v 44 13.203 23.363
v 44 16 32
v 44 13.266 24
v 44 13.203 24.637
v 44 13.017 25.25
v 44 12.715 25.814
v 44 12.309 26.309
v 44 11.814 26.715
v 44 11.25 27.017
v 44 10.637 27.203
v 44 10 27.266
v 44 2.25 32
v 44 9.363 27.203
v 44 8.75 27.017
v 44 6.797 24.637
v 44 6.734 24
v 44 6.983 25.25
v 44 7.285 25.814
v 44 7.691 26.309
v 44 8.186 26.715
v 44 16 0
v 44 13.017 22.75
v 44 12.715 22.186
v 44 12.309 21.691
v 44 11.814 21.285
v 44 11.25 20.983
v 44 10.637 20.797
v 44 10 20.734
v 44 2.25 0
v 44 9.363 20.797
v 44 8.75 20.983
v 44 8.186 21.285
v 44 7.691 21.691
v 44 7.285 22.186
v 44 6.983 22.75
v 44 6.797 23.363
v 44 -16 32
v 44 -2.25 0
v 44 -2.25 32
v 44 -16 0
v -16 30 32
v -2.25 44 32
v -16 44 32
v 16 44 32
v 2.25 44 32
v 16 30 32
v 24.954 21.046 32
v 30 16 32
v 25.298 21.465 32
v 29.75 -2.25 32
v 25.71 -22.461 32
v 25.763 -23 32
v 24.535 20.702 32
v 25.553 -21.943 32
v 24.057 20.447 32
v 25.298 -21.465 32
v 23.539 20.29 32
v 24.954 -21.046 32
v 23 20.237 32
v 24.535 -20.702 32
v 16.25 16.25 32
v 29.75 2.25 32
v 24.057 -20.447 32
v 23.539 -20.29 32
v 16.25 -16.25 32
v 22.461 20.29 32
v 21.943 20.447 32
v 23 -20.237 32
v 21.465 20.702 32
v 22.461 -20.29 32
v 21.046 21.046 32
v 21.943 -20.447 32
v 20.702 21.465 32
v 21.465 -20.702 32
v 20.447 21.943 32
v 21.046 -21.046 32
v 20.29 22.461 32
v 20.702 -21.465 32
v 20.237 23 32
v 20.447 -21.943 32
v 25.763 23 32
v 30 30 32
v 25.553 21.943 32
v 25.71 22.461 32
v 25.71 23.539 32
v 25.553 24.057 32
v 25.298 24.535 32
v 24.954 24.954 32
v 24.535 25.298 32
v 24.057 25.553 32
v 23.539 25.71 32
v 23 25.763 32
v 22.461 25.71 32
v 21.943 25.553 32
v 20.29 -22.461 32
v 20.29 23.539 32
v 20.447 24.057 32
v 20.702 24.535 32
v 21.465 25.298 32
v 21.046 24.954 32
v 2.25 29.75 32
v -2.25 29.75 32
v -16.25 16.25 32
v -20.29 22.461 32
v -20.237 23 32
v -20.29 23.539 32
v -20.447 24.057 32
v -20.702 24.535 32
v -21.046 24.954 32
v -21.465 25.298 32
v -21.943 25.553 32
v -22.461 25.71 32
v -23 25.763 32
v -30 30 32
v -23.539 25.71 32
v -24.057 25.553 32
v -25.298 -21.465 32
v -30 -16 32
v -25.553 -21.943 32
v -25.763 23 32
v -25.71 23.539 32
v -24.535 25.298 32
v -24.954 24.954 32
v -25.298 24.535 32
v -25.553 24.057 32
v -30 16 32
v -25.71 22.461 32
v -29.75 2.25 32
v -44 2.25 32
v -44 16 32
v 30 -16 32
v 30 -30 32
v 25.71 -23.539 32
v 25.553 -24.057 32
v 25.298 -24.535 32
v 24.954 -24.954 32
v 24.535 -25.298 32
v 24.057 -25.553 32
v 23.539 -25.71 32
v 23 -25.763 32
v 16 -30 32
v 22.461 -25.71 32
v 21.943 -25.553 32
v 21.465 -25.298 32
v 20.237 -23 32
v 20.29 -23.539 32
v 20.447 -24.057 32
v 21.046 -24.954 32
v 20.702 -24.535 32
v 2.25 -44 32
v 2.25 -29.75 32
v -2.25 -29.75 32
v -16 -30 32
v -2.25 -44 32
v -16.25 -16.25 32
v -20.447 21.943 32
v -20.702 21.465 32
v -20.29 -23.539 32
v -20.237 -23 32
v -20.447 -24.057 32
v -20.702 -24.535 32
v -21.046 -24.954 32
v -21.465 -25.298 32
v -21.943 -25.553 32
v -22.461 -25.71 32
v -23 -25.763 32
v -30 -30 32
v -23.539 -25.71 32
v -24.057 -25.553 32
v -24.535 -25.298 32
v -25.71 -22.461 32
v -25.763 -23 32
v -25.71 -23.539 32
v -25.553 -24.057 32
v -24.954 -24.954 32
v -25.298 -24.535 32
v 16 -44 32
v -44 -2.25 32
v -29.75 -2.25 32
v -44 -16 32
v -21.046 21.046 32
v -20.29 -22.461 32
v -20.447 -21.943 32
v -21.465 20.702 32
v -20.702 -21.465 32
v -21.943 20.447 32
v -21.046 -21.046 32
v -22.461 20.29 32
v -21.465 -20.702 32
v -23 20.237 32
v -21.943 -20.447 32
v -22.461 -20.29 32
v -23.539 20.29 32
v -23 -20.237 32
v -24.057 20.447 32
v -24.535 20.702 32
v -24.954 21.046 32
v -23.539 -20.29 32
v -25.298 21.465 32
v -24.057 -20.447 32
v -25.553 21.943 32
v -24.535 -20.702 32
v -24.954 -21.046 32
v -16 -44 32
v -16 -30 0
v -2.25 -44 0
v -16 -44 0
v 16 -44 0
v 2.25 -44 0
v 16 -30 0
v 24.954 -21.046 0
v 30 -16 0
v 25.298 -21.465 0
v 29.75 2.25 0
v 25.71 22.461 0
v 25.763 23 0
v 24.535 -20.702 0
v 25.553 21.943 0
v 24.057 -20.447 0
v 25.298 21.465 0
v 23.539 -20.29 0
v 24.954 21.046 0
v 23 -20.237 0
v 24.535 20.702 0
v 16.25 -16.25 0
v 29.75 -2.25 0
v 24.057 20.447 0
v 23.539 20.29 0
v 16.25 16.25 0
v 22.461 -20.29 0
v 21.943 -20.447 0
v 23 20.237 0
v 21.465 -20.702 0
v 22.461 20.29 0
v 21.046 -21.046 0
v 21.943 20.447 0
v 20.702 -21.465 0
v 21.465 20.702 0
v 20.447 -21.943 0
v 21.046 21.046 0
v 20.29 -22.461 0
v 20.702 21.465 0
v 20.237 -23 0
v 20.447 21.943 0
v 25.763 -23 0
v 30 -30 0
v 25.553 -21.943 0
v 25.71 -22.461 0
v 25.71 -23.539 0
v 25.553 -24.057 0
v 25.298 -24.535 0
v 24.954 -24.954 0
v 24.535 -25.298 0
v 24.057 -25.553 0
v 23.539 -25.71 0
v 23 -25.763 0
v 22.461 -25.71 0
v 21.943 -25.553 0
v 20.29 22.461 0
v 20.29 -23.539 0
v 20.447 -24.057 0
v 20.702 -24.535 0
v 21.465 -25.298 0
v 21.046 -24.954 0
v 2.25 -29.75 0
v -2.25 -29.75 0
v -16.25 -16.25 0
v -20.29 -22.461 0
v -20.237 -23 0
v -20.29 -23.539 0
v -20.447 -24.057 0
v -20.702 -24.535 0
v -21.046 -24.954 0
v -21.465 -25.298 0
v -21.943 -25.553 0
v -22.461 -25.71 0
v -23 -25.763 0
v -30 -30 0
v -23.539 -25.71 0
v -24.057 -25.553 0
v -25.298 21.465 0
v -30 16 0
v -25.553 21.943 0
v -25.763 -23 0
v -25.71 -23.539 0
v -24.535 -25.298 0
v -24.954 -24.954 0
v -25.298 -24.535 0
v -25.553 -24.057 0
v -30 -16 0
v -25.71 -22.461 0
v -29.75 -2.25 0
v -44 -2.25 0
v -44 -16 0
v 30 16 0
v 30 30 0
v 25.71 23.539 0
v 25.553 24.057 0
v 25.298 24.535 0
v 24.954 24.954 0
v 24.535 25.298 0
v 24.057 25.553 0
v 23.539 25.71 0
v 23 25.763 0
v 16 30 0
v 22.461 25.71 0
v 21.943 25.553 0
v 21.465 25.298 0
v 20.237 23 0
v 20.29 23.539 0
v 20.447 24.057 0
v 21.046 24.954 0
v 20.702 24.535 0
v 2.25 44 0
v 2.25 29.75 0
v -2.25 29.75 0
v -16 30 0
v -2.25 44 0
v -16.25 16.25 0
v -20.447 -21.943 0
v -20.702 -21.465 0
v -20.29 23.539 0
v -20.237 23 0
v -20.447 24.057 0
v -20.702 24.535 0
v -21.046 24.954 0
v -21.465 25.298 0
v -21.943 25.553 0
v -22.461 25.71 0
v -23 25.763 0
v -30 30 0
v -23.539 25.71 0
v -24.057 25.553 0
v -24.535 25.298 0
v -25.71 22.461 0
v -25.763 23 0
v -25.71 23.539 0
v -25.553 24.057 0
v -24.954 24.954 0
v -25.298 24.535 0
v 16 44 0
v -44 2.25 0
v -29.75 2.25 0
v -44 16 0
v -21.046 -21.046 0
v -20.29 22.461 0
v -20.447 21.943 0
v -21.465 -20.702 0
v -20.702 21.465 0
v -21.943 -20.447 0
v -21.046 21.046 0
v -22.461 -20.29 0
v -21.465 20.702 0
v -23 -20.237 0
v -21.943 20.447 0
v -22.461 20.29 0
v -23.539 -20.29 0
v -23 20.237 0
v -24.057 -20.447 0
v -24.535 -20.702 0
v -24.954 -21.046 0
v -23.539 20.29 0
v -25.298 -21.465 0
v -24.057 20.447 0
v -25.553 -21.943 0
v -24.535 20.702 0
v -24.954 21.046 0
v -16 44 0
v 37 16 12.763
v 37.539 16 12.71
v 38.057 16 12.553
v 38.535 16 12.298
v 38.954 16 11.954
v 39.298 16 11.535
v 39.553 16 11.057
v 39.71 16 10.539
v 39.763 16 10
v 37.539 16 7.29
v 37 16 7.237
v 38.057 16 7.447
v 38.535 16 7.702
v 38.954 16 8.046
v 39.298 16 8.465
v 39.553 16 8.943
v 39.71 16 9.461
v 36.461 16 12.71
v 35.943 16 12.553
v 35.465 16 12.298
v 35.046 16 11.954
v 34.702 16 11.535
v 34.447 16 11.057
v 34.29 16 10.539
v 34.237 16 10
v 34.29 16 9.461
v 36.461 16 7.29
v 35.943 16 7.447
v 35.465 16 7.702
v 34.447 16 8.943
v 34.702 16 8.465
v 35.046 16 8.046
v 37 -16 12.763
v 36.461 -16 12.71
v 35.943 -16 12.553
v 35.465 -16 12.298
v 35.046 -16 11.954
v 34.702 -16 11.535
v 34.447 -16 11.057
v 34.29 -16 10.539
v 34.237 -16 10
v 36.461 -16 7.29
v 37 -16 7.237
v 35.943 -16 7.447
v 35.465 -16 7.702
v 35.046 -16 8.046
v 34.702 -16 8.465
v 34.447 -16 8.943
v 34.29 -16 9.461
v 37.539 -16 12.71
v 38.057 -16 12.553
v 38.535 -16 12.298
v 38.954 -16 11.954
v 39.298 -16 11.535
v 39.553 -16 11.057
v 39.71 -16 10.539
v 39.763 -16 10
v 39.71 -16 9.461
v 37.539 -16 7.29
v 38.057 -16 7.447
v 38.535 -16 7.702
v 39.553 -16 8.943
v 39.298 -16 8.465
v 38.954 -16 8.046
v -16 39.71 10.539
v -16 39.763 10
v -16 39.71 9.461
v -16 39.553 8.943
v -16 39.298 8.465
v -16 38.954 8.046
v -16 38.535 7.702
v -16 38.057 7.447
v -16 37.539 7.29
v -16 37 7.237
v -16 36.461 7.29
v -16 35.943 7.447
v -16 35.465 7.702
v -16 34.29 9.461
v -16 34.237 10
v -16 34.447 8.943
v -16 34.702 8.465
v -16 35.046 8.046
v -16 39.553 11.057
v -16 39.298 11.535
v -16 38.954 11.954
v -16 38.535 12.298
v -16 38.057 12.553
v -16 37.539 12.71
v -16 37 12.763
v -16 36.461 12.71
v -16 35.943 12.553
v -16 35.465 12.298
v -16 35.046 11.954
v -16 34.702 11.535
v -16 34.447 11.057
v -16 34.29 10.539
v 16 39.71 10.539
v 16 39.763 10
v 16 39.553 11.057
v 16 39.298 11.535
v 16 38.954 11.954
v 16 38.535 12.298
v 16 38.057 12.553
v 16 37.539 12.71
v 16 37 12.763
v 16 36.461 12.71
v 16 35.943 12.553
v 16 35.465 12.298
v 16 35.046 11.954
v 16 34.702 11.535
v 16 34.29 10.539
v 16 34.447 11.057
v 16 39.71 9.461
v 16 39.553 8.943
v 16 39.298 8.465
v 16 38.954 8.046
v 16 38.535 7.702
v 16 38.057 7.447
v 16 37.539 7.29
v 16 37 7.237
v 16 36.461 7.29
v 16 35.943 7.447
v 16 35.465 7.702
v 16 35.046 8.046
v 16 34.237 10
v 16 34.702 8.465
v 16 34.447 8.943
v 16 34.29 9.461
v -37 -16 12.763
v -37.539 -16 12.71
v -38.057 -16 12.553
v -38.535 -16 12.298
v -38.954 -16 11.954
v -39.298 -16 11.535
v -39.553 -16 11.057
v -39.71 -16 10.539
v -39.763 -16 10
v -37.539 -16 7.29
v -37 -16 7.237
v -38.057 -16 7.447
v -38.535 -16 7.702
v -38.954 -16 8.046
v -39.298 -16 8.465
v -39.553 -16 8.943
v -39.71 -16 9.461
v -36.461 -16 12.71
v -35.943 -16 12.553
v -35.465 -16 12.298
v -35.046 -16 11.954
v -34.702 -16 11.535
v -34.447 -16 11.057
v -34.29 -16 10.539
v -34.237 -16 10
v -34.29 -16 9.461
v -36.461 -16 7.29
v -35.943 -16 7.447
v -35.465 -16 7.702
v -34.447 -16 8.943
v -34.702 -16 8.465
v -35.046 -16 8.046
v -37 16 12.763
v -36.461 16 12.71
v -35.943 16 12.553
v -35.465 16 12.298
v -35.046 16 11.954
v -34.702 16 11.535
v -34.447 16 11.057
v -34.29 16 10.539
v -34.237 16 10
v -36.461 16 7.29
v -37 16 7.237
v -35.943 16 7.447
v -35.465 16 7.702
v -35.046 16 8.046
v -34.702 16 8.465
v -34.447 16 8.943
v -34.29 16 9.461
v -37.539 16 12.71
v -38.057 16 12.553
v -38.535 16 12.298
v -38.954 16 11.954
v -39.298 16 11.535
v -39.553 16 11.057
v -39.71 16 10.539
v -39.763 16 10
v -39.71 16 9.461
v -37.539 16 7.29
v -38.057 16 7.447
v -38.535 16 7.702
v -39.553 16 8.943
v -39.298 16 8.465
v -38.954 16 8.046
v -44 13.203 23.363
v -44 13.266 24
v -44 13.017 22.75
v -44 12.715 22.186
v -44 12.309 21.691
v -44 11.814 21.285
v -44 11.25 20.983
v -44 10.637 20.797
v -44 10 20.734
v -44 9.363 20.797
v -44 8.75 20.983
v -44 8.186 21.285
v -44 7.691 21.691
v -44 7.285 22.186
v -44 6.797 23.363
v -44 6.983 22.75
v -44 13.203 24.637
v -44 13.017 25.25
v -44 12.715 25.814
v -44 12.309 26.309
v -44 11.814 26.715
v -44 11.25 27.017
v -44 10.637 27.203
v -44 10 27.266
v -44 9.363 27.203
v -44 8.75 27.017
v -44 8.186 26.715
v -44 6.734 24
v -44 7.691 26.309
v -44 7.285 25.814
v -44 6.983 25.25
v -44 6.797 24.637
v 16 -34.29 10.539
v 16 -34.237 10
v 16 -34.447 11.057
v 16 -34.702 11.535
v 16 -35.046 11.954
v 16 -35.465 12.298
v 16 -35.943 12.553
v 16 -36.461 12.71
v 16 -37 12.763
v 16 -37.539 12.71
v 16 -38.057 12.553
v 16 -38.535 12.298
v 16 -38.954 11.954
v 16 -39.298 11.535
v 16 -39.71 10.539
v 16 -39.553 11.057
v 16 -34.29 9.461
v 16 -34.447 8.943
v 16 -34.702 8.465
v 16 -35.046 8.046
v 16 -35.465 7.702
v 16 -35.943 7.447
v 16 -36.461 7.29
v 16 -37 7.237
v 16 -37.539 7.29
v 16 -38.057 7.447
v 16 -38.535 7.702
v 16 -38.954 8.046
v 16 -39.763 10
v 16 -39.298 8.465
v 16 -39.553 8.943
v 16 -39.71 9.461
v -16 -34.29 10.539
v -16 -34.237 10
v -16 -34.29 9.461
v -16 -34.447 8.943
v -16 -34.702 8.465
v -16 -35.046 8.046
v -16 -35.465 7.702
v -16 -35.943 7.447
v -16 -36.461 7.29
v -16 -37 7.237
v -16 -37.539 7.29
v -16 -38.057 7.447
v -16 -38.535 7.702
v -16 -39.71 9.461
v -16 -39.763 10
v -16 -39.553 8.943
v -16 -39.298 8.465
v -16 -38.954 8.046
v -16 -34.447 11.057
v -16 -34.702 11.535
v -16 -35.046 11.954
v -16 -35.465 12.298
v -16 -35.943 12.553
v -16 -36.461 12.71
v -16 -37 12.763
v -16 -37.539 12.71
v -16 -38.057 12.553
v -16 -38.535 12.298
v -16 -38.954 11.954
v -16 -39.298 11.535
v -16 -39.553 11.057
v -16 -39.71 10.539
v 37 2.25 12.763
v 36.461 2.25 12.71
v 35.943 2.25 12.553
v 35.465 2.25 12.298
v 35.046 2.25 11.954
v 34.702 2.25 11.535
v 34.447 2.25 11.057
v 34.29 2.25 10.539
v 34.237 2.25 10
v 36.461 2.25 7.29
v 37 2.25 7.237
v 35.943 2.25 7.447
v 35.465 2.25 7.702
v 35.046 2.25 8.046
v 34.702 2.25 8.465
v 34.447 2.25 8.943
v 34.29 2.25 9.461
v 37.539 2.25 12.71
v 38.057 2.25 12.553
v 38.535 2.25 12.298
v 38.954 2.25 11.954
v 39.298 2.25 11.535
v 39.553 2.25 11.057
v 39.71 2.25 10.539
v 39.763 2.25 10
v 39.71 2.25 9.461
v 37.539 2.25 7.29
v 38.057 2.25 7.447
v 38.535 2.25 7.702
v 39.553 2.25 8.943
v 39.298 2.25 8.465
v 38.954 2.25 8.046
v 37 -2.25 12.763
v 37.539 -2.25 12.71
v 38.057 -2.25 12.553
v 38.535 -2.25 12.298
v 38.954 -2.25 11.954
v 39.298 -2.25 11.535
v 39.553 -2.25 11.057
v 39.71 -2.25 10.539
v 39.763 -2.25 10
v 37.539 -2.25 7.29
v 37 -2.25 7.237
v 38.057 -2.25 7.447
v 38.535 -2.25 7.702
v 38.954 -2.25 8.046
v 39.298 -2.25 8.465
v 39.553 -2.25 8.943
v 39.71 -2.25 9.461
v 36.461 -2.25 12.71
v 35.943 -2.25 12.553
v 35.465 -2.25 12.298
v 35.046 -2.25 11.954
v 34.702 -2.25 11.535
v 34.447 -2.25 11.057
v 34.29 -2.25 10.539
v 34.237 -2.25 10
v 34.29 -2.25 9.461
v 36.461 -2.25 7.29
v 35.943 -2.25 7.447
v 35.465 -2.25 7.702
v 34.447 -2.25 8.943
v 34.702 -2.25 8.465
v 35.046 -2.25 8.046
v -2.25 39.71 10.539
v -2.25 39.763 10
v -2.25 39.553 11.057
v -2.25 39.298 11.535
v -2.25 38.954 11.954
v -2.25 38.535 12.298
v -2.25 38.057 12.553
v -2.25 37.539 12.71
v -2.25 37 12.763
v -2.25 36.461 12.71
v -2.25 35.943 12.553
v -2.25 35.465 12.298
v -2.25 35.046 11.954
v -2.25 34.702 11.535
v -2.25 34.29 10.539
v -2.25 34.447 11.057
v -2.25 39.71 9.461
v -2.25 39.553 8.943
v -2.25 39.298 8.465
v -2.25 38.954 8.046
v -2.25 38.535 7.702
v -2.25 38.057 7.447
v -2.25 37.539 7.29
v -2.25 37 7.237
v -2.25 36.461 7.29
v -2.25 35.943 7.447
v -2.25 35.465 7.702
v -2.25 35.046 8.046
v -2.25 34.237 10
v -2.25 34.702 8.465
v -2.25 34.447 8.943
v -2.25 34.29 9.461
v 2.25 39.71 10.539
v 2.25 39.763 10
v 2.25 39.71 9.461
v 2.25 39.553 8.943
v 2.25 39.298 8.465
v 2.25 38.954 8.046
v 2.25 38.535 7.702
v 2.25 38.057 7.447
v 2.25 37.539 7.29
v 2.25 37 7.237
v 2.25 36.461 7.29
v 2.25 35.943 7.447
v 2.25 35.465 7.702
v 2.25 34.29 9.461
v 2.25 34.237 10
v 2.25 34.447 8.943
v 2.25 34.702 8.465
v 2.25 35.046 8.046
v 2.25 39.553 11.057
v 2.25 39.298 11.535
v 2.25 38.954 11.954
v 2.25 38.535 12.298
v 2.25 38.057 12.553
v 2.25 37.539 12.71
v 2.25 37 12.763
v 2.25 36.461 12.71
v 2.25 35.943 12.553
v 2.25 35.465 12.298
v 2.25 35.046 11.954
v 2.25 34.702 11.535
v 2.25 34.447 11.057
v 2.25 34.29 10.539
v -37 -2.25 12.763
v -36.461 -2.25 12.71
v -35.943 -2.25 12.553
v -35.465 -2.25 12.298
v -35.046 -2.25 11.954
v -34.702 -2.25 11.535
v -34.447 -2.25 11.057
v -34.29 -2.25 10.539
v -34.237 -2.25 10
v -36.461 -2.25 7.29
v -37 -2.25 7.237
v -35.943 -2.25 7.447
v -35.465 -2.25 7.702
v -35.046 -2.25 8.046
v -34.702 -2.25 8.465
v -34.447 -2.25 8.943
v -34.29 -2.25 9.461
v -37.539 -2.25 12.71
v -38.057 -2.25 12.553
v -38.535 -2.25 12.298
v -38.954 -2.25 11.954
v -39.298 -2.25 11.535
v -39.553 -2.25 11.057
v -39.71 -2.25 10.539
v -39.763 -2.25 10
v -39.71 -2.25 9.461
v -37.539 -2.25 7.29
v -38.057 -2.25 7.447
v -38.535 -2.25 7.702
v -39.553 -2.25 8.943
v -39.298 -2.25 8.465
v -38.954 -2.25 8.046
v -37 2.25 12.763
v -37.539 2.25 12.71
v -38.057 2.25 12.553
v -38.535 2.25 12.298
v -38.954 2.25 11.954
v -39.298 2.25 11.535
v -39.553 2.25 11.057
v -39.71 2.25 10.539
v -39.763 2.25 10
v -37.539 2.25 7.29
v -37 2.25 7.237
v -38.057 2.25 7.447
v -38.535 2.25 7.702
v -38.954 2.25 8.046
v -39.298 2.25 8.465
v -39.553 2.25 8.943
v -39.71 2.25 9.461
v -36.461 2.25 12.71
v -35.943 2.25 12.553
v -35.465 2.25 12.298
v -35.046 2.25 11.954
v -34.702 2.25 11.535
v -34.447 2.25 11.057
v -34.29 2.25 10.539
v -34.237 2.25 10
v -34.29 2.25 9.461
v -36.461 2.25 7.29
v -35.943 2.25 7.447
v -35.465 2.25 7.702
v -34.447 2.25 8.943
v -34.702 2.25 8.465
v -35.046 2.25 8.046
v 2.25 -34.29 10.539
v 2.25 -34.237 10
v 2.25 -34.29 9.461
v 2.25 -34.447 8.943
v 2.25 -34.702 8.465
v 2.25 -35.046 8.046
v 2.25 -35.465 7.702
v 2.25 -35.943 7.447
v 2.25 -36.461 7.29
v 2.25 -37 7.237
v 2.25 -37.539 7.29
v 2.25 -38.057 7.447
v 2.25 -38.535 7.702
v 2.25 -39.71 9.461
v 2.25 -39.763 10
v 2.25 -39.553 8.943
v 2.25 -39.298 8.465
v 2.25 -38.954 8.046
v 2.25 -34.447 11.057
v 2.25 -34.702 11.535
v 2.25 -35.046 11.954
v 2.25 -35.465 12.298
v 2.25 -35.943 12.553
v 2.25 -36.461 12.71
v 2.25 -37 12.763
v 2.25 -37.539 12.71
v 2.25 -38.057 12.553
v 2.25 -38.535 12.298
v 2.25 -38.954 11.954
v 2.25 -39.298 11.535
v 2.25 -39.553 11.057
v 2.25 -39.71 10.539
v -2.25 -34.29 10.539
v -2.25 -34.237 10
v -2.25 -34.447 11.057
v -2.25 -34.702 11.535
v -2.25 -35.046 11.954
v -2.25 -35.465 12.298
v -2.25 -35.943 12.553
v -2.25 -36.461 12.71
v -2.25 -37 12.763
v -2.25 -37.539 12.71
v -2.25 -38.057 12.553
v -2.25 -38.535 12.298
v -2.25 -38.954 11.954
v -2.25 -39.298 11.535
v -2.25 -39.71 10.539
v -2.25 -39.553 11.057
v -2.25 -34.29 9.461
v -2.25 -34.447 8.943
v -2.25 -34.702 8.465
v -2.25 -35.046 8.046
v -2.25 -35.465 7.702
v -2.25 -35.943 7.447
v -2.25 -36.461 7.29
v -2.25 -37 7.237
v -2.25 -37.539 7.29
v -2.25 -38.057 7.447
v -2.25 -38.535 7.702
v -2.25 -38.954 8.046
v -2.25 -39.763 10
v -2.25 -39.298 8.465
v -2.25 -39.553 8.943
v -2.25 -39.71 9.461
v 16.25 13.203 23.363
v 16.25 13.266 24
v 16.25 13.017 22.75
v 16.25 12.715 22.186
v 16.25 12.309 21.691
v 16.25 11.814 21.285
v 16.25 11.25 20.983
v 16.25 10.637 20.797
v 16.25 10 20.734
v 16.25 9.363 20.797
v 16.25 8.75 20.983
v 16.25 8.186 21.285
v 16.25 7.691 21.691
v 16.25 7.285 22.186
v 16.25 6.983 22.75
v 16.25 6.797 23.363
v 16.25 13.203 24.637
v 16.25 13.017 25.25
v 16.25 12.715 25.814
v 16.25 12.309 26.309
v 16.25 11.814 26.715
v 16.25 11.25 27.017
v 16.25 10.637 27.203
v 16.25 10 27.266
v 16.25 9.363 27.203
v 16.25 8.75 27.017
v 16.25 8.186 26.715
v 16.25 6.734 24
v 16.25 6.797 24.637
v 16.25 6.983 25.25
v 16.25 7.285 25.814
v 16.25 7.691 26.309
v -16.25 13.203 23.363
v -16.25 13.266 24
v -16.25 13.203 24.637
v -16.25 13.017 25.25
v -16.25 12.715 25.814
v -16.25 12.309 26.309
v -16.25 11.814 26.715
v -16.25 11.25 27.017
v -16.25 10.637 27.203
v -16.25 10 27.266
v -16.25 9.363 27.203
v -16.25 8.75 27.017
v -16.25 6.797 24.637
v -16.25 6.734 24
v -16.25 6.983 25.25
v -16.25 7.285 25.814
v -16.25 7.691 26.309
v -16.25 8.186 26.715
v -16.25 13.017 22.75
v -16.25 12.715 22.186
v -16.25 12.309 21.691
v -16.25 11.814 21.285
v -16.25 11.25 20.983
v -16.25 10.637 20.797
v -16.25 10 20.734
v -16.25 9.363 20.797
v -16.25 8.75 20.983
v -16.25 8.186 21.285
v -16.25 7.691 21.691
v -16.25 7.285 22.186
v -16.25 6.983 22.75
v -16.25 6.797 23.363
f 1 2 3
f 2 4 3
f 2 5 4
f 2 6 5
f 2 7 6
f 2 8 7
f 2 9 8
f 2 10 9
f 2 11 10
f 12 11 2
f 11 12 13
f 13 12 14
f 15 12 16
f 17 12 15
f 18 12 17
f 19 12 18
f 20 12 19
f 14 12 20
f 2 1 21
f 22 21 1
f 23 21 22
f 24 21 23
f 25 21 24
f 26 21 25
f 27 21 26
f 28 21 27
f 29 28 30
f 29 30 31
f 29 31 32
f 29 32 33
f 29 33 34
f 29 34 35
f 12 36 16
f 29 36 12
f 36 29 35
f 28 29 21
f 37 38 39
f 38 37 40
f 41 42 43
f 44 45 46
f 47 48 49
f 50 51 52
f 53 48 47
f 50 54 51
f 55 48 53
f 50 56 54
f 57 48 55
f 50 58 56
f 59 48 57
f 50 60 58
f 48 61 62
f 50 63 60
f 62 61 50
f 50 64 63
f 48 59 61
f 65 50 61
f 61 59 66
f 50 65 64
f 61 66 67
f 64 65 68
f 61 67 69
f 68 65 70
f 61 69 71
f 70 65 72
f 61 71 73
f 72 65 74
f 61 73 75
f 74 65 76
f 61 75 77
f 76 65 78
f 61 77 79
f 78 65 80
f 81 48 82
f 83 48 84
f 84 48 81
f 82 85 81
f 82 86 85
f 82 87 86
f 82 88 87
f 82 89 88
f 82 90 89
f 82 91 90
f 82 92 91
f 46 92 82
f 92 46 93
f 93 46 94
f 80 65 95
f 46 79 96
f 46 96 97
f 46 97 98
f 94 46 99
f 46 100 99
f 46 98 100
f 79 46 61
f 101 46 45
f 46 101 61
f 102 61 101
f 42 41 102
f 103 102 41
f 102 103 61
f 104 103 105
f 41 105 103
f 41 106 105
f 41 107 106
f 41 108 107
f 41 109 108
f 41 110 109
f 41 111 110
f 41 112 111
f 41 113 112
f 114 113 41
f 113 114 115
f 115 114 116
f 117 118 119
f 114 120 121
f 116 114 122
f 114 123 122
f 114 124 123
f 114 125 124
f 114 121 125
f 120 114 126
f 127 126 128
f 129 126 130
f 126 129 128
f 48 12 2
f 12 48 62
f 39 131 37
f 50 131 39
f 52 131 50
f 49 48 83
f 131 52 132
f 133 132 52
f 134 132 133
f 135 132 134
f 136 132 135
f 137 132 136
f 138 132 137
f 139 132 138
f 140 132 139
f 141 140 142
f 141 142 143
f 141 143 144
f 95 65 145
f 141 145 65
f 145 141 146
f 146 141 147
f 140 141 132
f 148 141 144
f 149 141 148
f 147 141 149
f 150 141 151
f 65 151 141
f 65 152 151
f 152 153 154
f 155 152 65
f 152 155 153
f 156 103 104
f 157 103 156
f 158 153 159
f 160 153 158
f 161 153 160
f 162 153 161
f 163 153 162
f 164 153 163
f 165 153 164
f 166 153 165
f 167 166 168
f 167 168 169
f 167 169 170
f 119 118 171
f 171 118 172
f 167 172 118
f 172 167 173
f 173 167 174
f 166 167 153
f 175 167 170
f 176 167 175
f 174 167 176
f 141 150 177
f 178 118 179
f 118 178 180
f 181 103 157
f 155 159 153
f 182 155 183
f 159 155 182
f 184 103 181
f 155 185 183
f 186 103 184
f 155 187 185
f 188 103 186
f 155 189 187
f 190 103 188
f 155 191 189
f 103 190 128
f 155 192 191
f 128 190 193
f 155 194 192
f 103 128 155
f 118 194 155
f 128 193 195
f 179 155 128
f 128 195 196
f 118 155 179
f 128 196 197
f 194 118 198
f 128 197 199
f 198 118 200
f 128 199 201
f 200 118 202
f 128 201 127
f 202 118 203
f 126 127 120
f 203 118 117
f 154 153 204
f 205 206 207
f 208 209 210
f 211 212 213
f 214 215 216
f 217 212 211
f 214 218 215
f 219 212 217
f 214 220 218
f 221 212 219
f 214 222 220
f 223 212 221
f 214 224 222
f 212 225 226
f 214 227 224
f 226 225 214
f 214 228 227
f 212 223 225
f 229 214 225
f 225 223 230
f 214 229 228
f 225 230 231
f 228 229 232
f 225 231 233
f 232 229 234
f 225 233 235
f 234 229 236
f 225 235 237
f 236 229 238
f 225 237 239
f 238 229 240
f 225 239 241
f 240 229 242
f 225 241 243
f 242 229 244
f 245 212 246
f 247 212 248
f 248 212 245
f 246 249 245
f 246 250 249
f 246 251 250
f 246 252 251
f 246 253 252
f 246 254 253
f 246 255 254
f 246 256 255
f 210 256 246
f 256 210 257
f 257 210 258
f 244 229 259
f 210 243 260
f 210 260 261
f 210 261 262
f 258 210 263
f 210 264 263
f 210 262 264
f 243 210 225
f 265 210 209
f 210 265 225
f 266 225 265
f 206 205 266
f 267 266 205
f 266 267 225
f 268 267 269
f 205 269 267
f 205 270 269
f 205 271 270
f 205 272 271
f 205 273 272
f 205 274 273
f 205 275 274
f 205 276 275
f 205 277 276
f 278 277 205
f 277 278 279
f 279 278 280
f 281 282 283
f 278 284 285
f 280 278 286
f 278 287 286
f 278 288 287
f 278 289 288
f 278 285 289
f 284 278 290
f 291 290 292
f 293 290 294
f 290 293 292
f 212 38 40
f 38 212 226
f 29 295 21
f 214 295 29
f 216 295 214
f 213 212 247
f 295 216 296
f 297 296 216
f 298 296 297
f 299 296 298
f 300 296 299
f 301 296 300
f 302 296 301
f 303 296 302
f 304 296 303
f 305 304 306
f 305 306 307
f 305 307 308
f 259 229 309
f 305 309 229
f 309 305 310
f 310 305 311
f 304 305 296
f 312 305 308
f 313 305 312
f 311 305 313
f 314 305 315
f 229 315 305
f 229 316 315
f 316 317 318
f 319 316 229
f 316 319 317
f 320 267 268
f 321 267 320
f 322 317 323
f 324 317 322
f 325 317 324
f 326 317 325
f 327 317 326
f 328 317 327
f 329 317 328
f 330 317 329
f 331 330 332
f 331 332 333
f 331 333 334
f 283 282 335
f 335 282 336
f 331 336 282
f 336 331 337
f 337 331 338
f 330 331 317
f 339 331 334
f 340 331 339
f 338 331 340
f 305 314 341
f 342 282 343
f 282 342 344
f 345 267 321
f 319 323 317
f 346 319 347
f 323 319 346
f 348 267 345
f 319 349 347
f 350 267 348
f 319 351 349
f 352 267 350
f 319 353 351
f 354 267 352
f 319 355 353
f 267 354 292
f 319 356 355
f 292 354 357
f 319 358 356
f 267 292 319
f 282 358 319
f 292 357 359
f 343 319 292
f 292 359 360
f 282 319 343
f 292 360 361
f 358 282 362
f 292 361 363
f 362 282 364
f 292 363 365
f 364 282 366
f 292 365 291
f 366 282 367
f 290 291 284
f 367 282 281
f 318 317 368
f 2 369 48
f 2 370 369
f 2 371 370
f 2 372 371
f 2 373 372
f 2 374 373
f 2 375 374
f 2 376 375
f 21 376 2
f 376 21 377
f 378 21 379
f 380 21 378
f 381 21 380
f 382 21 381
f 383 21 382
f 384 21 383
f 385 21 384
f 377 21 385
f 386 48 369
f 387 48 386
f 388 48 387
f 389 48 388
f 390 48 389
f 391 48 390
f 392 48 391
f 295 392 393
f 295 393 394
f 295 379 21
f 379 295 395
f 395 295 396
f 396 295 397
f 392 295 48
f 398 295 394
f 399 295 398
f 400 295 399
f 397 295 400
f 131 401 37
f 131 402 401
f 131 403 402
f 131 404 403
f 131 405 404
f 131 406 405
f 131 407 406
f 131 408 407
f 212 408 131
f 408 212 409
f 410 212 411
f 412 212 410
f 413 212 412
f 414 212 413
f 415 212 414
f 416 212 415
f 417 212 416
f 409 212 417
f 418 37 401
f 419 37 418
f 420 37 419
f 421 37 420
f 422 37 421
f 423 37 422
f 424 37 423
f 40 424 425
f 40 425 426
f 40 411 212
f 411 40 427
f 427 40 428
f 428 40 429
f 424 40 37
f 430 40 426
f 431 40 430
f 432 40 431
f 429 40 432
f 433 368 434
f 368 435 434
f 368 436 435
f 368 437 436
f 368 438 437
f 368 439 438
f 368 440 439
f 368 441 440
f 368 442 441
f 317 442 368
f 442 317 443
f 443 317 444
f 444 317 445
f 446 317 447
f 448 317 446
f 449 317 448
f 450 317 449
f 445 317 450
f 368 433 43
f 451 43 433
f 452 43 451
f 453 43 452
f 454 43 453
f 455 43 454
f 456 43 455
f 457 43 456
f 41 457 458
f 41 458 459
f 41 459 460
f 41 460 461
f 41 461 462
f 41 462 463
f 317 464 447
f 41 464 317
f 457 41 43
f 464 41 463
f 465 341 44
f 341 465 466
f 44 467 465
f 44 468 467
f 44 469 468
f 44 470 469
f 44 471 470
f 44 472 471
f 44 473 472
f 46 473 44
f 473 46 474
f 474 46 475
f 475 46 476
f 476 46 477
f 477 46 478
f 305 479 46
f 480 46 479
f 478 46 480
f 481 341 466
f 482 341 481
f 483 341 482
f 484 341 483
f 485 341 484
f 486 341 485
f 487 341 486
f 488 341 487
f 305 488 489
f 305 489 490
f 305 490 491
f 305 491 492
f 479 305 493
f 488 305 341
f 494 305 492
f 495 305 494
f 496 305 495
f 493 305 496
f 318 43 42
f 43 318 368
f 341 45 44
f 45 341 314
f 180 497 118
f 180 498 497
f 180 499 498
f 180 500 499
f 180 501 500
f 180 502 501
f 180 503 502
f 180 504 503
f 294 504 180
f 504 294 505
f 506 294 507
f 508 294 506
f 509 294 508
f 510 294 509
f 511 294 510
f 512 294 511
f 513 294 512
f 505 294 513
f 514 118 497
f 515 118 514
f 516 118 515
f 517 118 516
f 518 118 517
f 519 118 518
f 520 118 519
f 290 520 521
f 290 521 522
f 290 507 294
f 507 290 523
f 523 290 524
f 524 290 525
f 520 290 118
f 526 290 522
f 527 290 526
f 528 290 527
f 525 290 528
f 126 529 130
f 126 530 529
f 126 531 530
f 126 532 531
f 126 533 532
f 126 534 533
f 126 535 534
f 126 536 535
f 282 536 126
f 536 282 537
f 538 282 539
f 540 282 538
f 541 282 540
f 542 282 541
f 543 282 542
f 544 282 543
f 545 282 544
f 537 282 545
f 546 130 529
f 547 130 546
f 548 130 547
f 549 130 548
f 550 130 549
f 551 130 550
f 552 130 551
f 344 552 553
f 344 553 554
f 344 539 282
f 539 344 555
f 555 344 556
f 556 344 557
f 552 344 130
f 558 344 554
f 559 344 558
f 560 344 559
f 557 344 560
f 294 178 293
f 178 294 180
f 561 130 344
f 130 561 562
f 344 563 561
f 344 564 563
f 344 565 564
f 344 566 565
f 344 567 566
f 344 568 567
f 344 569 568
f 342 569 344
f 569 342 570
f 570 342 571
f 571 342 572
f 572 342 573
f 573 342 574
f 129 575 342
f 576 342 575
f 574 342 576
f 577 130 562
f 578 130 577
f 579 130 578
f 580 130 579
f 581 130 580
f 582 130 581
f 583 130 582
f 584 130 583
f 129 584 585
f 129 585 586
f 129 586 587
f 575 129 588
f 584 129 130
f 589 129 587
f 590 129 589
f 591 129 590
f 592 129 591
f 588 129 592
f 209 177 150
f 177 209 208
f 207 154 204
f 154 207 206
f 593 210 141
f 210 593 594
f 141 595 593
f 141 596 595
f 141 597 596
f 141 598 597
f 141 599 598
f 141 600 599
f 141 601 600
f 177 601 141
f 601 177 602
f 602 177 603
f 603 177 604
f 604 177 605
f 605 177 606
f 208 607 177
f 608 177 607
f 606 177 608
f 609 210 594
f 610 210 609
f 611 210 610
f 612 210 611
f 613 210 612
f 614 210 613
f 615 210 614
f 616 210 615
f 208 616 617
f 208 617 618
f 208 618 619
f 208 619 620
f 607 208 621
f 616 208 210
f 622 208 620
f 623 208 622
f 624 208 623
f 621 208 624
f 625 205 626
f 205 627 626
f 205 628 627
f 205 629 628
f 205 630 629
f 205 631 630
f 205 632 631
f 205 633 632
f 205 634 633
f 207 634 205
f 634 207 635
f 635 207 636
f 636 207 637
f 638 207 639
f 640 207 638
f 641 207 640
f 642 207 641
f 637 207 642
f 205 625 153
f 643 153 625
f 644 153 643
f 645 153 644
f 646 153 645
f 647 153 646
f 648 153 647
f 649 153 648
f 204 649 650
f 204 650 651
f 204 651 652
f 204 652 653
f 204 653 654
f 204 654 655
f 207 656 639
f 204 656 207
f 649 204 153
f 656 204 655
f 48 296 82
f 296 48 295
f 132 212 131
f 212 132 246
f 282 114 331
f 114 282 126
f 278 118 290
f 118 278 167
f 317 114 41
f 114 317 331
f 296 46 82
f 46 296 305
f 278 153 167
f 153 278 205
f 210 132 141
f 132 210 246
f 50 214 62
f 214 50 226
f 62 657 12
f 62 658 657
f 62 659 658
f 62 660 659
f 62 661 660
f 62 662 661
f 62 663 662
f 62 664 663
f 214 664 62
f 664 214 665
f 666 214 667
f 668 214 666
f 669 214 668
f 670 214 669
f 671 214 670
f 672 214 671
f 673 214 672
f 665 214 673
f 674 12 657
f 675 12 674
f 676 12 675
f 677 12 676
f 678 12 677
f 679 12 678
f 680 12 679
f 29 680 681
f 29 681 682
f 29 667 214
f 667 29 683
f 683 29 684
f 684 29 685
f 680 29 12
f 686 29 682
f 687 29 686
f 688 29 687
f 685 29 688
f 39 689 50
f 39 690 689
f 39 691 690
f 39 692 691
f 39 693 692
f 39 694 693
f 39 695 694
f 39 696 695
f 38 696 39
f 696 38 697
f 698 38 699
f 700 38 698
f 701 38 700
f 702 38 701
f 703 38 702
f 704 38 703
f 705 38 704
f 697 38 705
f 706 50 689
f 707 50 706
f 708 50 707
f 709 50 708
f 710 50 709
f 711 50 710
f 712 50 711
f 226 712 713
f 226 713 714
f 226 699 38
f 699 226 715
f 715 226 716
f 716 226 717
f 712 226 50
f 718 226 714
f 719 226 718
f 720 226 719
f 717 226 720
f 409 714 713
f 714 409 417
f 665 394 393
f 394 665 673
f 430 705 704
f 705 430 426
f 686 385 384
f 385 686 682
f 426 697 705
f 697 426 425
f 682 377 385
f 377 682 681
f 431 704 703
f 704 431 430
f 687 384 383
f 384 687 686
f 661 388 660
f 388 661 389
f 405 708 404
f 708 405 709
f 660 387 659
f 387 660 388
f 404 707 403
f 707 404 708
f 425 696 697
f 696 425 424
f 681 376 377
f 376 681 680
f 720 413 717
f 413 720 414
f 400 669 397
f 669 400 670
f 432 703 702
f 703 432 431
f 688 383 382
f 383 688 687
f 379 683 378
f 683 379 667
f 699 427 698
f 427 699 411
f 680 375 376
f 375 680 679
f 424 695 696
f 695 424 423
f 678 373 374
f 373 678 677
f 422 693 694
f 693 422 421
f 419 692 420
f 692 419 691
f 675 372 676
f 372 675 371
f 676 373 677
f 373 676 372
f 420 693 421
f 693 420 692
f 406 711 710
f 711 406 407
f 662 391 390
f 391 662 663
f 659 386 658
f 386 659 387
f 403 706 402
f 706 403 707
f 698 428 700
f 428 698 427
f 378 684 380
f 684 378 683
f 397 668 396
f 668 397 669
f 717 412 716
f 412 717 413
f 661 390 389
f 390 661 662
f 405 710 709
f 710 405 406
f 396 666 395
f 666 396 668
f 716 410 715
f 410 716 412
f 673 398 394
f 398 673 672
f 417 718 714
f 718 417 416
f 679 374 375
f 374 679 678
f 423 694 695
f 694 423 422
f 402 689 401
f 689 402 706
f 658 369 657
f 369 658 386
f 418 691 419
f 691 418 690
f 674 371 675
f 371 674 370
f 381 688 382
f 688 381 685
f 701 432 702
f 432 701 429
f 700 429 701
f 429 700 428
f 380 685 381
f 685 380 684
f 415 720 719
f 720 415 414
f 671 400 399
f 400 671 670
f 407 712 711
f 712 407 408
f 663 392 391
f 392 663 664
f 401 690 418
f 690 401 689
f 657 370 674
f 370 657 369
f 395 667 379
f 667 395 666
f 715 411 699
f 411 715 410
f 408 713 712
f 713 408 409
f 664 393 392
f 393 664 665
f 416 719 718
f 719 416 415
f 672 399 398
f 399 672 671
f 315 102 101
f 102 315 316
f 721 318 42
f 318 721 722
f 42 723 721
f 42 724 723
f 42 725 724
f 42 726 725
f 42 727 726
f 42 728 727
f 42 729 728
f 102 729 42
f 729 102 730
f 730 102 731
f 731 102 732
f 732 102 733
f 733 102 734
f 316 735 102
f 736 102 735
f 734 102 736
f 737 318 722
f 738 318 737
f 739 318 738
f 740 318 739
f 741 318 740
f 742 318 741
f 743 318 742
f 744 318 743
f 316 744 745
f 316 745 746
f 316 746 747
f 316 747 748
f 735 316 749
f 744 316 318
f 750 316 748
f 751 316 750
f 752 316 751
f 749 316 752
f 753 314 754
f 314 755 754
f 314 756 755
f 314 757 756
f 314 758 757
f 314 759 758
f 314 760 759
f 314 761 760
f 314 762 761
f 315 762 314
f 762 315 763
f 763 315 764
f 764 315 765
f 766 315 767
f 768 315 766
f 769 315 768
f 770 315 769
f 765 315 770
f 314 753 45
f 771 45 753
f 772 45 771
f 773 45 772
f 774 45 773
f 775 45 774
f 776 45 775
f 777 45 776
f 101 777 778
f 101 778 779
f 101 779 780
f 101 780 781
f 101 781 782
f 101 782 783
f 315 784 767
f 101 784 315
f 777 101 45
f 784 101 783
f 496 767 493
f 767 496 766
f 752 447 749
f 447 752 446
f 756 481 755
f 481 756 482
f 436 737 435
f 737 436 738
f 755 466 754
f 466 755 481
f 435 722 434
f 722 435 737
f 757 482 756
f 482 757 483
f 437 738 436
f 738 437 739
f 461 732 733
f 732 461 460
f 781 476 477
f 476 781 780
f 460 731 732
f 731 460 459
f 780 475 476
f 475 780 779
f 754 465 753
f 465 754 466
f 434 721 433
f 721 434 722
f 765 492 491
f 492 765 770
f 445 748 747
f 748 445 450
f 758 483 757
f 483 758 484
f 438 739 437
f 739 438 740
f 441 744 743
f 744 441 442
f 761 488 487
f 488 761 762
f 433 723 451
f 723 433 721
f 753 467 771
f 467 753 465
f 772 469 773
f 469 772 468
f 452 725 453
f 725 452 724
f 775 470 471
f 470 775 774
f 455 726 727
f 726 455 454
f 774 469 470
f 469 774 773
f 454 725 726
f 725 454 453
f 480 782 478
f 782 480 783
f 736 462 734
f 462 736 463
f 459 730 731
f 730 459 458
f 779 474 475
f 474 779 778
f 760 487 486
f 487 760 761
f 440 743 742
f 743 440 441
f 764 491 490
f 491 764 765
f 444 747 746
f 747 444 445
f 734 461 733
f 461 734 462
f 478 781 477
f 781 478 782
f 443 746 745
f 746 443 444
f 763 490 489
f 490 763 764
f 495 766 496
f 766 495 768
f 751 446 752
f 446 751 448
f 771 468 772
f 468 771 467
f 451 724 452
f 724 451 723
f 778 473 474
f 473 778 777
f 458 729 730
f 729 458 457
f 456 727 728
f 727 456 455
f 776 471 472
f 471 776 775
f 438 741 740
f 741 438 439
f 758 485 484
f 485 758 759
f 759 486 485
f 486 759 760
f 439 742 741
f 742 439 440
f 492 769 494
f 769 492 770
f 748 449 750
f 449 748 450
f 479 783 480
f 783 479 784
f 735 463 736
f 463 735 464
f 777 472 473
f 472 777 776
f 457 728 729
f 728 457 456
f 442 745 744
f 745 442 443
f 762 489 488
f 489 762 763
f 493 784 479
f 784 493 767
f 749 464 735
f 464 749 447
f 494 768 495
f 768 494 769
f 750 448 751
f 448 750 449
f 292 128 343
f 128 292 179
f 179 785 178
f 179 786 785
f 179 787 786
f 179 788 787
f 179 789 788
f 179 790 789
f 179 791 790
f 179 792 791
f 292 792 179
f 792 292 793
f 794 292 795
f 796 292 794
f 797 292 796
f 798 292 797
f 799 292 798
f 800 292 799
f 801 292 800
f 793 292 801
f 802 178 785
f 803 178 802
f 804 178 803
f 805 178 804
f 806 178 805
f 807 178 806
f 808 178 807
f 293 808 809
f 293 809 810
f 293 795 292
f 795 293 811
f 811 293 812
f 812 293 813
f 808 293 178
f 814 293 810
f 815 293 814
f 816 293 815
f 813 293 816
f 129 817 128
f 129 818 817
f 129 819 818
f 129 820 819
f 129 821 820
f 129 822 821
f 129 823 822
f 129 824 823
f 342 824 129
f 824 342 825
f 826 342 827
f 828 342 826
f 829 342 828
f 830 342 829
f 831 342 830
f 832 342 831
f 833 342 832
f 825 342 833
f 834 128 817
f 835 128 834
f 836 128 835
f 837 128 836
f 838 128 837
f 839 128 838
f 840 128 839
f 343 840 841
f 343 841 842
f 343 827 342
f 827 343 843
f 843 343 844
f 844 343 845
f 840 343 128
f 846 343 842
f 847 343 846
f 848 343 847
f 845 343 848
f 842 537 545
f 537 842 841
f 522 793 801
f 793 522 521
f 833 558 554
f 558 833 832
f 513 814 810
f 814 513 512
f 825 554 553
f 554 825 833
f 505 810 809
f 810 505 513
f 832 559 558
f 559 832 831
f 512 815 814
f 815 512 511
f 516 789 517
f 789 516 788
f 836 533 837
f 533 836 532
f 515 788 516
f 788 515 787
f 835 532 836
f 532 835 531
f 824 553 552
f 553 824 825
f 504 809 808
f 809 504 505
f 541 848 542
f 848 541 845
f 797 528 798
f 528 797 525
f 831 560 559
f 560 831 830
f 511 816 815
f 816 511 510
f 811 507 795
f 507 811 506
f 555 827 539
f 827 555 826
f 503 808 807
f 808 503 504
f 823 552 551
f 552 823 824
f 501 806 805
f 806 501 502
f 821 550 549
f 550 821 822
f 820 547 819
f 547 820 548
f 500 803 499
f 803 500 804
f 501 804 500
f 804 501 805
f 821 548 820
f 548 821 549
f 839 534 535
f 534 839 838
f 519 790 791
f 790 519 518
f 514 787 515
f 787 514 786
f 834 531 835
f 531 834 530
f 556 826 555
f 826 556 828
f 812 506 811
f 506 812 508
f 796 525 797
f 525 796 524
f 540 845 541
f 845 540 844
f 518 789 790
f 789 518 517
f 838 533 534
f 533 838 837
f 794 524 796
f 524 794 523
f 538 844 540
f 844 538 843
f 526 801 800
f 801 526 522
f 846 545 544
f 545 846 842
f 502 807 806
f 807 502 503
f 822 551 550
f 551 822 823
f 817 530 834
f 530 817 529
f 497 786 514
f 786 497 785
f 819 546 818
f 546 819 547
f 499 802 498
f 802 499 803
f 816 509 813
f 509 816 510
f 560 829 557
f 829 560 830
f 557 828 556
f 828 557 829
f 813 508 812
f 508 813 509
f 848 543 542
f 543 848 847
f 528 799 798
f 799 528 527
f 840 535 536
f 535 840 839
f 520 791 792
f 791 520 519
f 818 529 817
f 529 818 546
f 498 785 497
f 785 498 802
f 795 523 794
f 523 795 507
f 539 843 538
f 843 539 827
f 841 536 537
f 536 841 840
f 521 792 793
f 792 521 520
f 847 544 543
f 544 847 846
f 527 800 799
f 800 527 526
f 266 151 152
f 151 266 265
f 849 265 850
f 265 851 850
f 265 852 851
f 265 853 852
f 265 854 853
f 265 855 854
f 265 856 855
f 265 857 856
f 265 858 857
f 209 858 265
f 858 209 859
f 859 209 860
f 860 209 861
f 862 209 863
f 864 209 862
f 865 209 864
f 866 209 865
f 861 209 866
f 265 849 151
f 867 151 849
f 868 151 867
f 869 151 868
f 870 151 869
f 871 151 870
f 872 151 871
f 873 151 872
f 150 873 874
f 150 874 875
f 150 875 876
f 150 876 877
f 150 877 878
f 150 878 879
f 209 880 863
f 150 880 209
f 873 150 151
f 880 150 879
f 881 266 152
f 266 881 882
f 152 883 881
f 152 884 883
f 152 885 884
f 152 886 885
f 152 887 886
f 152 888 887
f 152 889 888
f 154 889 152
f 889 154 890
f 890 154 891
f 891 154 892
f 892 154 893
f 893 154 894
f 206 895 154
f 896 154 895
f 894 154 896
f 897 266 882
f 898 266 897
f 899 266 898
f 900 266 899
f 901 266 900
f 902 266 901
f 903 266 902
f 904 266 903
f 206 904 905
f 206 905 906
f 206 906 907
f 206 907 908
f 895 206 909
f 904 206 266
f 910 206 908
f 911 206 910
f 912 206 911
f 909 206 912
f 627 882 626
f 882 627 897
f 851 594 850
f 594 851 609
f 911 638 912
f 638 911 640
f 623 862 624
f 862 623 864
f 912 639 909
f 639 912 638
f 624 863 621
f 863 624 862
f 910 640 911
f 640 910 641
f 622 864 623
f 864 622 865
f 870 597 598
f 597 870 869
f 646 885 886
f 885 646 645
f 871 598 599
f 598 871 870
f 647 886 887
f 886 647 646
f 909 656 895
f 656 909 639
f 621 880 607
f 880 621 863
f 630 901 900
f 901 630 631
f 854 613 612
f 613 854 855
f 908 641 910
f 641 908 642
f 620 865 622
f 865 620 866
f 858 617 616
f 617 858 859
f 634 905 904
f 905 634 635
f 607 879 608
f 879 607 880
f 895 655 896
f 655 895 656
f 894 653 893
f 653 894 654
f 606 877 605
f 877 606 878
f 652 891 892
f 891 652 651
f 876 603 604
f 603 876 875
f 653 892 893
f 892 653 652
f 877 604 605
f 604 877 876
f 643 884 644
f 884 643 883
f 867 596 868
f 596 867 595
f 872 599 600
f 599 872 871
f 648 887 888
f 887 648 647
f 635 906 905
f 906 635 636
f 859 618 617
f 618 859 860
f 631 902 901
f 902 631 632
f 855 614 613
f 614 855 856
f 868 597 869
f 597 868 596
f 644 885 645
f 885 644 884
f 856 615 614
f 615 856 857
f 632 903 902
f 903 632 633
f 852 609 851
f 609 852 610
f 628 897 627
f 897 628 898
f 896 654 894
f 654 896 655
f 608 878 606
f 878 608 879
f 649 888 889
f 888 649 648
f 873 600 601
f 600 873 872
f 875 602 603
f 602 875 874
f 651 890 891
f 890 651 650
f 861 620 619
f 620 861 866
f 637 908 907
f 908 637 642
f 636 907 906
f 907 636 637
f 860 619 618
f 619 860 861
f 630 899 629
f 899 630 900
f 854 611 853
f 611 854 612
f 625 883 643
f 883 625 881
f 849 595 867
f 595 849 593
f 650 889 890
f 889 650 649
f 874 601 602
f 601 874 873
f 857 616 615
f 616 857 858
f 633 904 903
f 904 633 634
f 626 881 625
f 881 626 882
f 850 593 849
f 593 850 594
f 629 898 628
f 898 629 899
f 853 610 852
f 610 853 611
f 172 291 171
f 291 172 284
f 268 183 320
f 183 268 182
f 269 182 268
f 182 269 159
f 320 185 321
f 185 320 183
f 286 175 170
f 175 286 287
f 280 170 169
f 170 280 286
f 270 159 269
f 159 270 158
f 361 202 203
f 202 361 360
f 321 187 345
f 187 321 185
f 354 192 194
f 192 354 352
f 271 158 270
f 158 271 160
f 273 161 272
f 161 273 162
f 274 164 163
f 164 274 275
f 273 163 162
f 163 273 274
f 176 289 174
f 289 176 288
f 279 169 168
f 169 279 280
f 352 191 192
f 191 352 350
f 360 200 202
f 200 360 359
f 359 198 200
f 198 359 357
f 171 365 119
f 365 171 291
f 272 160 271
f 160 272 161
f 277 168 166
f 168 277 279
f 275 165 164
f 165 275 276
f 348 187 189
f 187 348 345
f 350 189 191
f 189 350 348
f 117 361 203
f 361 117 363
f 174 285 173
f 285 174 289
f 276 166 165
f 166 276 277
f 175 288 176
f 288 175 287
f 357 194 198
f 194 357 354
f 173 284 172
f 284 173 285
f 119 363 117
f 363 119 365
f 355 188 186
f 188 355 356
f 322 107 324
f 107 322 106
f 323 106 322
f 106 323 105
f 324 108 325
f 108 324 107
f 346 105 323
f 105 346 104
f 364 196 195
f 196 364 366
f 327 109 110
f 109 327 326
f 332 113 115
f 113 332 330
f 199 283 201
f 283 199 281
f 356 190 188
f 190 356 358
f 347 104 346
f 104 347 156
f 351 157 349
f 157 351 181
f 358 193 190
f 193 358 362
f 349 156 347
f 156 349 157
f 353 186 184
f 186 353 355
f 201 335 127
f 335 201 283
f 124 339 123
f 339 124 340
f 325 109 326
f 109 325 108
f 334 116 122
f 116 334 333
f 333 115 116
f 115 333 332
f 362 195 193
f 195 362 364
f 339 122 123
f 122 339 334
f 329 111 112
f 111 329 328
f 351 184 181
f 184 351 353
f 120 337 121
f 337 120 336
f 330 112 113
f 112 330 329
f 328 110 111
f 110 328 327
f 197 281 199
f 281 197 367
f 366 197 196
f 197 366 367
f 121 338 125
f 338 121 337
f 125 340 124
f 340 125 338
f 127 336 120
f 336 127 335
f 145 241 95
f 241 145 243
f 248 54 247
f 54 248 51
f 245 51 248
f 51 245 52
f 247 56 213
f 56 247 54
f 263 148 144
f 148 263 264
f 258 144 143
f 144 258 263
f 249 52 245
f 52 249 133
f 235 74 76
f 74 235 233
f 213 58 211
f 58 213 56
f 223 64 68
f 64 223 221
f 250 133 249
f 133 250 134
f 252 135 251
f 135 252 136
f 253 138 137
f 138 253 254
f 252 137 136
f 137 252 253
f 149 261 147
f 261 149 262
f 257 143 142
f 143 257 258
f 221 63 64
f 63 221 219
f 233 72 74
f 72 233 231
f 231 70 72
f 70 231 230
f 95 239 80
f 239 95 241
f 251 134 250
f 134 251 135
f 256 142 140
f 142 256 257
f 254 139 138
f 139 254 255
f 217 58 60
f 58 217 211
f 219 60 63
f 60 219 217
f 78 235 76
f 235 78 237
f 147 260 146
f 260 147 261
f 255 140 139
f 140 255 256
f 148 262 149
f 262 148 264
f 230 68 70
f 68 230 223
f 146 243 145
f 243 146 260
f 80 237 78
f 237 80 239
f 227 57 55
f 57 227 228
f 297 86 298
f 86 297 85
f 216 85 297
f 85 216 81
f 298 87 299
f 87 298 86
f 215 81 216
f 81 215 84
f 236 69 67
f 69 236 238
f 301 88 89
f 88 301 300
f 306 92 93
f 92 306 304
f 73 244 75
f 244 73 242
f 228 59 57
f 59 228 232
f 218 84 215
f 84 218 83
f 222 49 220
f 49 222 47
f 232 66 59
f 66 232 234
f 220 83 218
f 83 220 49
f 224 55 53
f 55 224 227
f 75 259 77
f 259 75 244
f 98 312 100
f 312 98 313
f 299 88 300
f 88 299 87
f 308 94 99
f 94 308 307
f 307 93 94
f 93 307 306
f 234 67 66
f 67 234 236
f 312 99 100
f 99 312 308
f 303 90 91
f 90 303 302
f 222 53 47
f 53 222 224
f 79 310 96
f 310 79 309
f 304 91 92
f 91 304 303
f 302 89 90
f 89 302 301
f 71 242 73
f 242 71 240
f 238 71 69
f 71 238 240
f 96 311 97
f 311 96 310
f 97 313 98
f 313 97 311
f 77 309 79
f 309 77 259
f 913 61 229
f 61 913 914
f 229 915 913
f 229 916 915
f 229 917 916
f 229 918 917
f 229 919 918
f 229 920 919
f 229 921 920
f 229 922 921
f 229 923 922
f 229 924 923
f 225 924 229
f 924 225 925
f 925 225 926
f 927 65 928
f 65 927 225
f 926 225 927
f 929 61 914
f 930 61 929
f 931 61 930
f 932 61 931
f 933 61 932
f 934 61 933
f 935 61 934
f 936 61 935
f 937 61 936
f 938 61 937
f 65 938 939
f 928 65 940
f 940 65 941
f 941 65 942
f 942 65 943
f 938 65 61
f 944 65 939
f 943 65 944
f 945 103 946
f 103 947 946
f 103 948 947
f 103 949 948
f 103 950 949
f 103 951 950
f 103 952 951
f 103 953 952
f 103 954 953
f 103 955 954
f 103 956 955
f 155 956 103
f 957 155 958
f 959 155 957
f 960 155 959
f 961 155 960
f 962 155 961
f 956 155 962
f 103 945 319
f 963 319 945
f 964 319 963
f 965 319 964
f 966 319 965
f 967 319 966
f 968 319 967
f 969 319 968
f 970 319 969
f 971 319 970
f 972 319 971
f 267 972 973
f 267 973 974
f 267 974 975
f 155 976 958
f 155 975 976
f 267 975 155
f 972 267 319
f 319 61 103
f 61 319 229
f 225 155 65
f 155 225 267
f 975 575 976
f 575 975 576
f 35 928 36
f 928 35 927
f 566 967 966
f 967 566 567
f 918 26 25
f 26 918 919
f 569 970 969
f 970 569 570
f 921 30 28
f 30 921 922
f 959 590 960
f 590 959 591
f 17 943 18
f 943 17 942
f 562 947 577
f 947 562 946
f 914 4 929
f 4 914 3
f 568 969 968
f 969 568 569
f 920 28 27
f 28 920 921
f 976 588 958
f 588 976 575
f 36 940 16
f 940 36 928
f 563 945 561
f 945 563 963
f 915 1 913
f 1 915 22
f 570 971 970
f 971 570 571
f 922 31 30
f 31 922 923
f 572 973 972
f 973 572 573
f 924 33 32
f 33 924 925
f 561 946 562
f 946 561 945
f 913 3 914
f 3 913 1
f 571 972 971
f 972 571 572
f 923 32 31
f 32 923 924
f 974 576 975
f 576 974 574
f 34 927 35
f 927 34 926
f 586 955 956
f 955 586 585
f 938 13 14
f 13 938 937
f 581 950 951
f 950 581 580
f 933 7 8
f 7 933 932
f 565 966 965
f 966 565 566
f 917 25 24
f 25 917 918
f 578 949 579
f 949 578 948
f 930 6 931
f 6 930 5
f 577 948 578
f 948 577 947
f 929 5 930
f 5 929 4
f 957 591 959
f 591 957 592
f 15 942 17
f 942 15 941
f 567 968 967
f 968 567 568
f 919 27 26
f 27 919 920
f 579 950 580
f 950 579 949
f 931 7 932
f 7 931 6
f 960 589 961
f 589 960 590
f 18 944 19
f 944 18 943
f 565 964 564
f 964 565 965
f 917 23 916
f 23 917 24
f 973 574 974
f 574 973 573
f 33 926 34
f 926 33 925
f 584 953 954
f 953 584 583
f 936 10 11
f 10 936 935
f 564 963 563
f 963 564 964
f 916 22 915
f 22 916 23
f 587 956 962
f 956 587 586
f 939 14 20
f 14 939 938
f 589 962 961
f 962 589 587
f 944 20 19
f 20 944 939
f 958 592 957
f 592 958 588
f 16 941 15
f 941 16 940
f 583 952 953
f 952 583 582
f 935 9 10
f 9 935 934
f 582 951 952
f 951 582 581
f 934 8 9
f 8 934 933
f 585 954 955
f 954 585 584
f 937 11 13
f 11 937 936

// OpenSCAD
// file: ../../../../../scad/lib/parent_spar_bolted.scad
// Parent modular exterior v2. mm. Geometry shared by individual part wrappers.
// Metal fasteners, ballast, Takachi box and electronics are purchased items.
/* [Dimensions] */
disk_d=225; disk_t=5;
fin_h=125; fin_w=65; fin_t=4;
beam_w=32; clearance=0.5;
float_r=100; flange_r=112.5; float_bore_r=30;
float_wall=4; float_h=180; lid_t=6;
rod_r=105.5; flange_t=6;
hub_h=32; root_x=30; root_depth=14;
$fn=96; e=0.03;
assert(disk_d<=225 && 2*flange_r<=225);
assert(fin_h>=100 && fin_h<=150 && fin_w>=50 && fin_w<=80);
assert(root_x+fin_w<disk_d/2-5);
module bore(d,h) { cylinder(d=d/cos(180/32),h=h,$fn=32); }
module bore_x(d,l) { rotate([0,90,0]) bore(d,l); }
module bore_y(d,l) { rotate([-90,0,0]) bore(d,l); }
module square_bore(h) { translate([-(beam_w+clearance)/2,-(beam_w+clearance)/2,-e]) cube([beam_w+clearance,beam_w+clearance,h+2*e]); }
module rods(h,d=6.5) { for(a=[45:90:315]) rotate([0,0,a]) translate([rod_r,0,-e]) bore(d,h+2*e); }
module lid_bolts(h) { for(a=[22.5:45:359]) rotate([0,0,a]) translate([rod_r,0,-e]) bore(4.5,h+2*e); }
module hub_pin(z) { translate([-46,10,z]) bore_x(6.5,92); }
module disk() {
 difference() { cylinder(d=disk_d,h=disk_t); square_bore(disk_t);
  for(x=[-23,23],y=[-23,23]) translate([x,y,-e]) bore(5.5,disk_t+2*e);
 }
}
module fin() {
 difference() { cube([fin_w,fin_t,fin_h]);
  for(z=[10,fin_h-hub_h+10]) translate([root_depth/2,-e,z]) bore_y(5.5,fin_t+2*e);
 }
}
module hub() {
 difference() {
  union() { translate([-30,-30,0]) cube([60,60,hub_h]);
   for(a=[0:90:270]) rotate([0,0,a]) translate([28,-16,0]) cube([16,32,hub_h]);
  }
  square_bore(hub_h);
  for(a=[0:90:270]) rotate([0,0,a]) {
   translate([root_x-clearance/2,-(fin_t+clearance)/2,-e]) cube([root_depth+clearance,fin_t+clearance,hub_h+2*e]);
   translate([root_x+root_depth/2,-17,10]) bore_y(5.5,34);
  }
  for(x=[-23,23],y=[-23,23]) translate([x,y,-e]) bore(5.5,hub_h+2*e);
  hub_pin(24);
 }
}
module beam(lower=true) {
 len=lower?180:107;
 difference() { translate([-beam_w/2,-beam_w/2,0]) cube([beam_w,beam_w,len]);
  if(lower) { for(z=[24,117]) hub_pin(z); translate([-20,0,160]) bore_x(6.5,40); translate([0,0,-e]) bore(16,8); }
  else for(z=[20,87]) translate([-20,0,z]) bore_x(6.5,40);
 }
}
module coupler() {
 // One half of a screwed split coupler. Mirror Y for the second half.
 difference() { translate([-27,0.25,0]) cube([54,26.75,64]); square_bore(64);
  for(z=[12,52]) translate([-28,0,z]) bore_x(6.5,56);
  for(x=[-22,22],z=[24,40]) translate([x,-1,z]) bore_y(5.5,29);
 }
}
module float_body() {
 difference() {
  union() { cylinder(r=float_r,h=float_h);
   translate([0,0,float_h-flange_t]) cylinder(r=flange_r,h=flange_t);
   // 45-degree underside of the flange instead of a 15 mm unsupported ledge.
   translate([0,0,float_h-flange_t-(flange_r-float_r)]) cylinder(r1=float_r,r2=flange_r,h=flange_r-float_r);
  }
  translate([0,0,-e]) cylinder(r=float_bore_r,h=float_h+2*e);
  translate([0,0,float_wall]) difference() {
   cylinder(r=float_r-float_wall,h=float_h);
   cylinder(r=float_bore_r+float_wall,h=float_h+e);
  }
  // Coupling-nut clearance; nearest cavity wall remains >=3 mm thick.
  rods(float_h,13); lid_bolts(float_h);
  for(a=[22.5:45:359]) rotate([0,0,a]) translate([rod_r,0,-e]) bore(10,float_h-flange_t+e);
 }
}
module float_lid() {
 difference() {
  cylinder(r=flange_r,h=lid_t);
  translate([0,0,-e]) cylinder(r=float_bore_r,h=lid_t+2*e);
  rods(lid_t,13); lid_bolts(lid_t);
  // Continuous face seals: 2 mm cord, 2.4 wide x 1.5 deep grooves.
  for(r=[float_bore_r+float_wall/2,float_r-float_wall/2]) translate([0,0,-e]) difference() {
   cylinder(r=r+1.2,h=1.5+e); cylinder(r=r-1.2,h=1.5+2*e);
  }
 }
}
module float_end(top=true) {
 difference() {
  union() { cylinder(r=flange_r,h=8);
   if(top) translate([-30,-30,8-e]) cube([60,60,20+e]);
   else translate([-23,-23,-40]) cube([46,46,40+e]);
  }
  rods(8);
  if(top) for(x=[-20,20],y=[-20,20]) {
   translate([x,y,-e]) bore(5.5,29);
   translate([x,y,-e]) bore(11,18+e);
  }
  if(top) for(a=[22.5:45:359]) rotate([0,0,a]) translate([rod_r,0,-e]) bore(12,8+2*e);
  else { translate([0,0,-40]) square_bore(40-e);
   translate([-24,0,-20]) bore_x(6.5,48);
  }
 }
}
module ballast_body() {
 // Open upward in print orientation. In the assembly this cup is inverted.
 difference() {
  union() { cylinder(r=45,h=51); translate([0,0,45]) cylinder(r=60,h=6);
   translate([0,0,30]) cylinder(r1=45,r2=60,h=15);
  }
  translate([0,0,6]) cylinder(r=40,h=46);
  for(x=[-23,23],y=[-23,23]) translate([x,y,-e]) bore(5.5,7);
  translate([0,0,-e]) bore(8.5,7);
  for(a=[0:90:270]) rotate([0,0,a]) translate([52,0,29]) { bore(5.5,23); bore(12,16); }
 }
}
module ballast_lid() {
 difference() { cylinder(r=60,h=6);
  for(a=[0:90:270]) rotate([0,0,a]) translate([52,0,-e]) bore(5.5,7);
  // Flooded ballast compartment: drainage, no trapped air assumption.
  for(x=[-20,0,20]) translate([x,0,-e]) bore(6,7);
 }
}
module camera_bridge() {
 // Assembly frame: local top z=78; camera seat z=8. +Y faces camera front.
 difference() {
  union() {
   translate([-30,45,70]) cube([60,90,8]);
   translate([-70,125,0]) cube([140,100,8]);
   translate([-70,125,0]) cube([140,10,78]);
   for(x=[-64,56]) translate([x,0,0]) rotate([90,0,90]) linear_extrude(8)
    polygon([[135,8],[215,8],[135,70]]);
  }
  for(x=[-20,20],y=[50,90]) translate([x,y,69]) bore(5.5,10);
  for(x=[-11,11],y=[174,206]) translate([x,y,-e]) bore(5.5,10);
 }
}
module gps_bridge() {
 // Local attachment face X=0 at deck +X; top shelf z=175.
 difference() {
  union() { translate([0,-25,0]) cube([10,50,183]);
   translate([-90,-48,175]) cube([100,96,8]);
   for(y=[-17,25]) translate([0,y,0]) rotate([90,0,0]) linear_extrude(8)
    polygon([[e,155],[e,175+e],[-80,175+e]]);
  }
  for(y=[-20,20],z=[5,45]) translate([-e,y,z]) bore_x(5.5,11);
  for(y=[-34,34]) translate([-43,y,174]) bore(4.5,10);
 }
}
// Reference antenna envelope, correct mounting ears, not a printable antenna.
module gps_reference() {
 difference() {
  union() { translate([-30,-28,0]) cube([60,56,22.5]);
   translate([-10,-41,0]) cube([20,82,6]); }
  for(y=[-34,34]) translate([0,y,-e]) bore(4.5,7);
 }
}
// main file
// mm. part=print is the intended X1C orientation.
part="assembly"; // [assembly,print]
use <../../../../../scad/lib/parent_spar_bolted.scad>
if(part=="print") { hub(); } else { hub(); }
